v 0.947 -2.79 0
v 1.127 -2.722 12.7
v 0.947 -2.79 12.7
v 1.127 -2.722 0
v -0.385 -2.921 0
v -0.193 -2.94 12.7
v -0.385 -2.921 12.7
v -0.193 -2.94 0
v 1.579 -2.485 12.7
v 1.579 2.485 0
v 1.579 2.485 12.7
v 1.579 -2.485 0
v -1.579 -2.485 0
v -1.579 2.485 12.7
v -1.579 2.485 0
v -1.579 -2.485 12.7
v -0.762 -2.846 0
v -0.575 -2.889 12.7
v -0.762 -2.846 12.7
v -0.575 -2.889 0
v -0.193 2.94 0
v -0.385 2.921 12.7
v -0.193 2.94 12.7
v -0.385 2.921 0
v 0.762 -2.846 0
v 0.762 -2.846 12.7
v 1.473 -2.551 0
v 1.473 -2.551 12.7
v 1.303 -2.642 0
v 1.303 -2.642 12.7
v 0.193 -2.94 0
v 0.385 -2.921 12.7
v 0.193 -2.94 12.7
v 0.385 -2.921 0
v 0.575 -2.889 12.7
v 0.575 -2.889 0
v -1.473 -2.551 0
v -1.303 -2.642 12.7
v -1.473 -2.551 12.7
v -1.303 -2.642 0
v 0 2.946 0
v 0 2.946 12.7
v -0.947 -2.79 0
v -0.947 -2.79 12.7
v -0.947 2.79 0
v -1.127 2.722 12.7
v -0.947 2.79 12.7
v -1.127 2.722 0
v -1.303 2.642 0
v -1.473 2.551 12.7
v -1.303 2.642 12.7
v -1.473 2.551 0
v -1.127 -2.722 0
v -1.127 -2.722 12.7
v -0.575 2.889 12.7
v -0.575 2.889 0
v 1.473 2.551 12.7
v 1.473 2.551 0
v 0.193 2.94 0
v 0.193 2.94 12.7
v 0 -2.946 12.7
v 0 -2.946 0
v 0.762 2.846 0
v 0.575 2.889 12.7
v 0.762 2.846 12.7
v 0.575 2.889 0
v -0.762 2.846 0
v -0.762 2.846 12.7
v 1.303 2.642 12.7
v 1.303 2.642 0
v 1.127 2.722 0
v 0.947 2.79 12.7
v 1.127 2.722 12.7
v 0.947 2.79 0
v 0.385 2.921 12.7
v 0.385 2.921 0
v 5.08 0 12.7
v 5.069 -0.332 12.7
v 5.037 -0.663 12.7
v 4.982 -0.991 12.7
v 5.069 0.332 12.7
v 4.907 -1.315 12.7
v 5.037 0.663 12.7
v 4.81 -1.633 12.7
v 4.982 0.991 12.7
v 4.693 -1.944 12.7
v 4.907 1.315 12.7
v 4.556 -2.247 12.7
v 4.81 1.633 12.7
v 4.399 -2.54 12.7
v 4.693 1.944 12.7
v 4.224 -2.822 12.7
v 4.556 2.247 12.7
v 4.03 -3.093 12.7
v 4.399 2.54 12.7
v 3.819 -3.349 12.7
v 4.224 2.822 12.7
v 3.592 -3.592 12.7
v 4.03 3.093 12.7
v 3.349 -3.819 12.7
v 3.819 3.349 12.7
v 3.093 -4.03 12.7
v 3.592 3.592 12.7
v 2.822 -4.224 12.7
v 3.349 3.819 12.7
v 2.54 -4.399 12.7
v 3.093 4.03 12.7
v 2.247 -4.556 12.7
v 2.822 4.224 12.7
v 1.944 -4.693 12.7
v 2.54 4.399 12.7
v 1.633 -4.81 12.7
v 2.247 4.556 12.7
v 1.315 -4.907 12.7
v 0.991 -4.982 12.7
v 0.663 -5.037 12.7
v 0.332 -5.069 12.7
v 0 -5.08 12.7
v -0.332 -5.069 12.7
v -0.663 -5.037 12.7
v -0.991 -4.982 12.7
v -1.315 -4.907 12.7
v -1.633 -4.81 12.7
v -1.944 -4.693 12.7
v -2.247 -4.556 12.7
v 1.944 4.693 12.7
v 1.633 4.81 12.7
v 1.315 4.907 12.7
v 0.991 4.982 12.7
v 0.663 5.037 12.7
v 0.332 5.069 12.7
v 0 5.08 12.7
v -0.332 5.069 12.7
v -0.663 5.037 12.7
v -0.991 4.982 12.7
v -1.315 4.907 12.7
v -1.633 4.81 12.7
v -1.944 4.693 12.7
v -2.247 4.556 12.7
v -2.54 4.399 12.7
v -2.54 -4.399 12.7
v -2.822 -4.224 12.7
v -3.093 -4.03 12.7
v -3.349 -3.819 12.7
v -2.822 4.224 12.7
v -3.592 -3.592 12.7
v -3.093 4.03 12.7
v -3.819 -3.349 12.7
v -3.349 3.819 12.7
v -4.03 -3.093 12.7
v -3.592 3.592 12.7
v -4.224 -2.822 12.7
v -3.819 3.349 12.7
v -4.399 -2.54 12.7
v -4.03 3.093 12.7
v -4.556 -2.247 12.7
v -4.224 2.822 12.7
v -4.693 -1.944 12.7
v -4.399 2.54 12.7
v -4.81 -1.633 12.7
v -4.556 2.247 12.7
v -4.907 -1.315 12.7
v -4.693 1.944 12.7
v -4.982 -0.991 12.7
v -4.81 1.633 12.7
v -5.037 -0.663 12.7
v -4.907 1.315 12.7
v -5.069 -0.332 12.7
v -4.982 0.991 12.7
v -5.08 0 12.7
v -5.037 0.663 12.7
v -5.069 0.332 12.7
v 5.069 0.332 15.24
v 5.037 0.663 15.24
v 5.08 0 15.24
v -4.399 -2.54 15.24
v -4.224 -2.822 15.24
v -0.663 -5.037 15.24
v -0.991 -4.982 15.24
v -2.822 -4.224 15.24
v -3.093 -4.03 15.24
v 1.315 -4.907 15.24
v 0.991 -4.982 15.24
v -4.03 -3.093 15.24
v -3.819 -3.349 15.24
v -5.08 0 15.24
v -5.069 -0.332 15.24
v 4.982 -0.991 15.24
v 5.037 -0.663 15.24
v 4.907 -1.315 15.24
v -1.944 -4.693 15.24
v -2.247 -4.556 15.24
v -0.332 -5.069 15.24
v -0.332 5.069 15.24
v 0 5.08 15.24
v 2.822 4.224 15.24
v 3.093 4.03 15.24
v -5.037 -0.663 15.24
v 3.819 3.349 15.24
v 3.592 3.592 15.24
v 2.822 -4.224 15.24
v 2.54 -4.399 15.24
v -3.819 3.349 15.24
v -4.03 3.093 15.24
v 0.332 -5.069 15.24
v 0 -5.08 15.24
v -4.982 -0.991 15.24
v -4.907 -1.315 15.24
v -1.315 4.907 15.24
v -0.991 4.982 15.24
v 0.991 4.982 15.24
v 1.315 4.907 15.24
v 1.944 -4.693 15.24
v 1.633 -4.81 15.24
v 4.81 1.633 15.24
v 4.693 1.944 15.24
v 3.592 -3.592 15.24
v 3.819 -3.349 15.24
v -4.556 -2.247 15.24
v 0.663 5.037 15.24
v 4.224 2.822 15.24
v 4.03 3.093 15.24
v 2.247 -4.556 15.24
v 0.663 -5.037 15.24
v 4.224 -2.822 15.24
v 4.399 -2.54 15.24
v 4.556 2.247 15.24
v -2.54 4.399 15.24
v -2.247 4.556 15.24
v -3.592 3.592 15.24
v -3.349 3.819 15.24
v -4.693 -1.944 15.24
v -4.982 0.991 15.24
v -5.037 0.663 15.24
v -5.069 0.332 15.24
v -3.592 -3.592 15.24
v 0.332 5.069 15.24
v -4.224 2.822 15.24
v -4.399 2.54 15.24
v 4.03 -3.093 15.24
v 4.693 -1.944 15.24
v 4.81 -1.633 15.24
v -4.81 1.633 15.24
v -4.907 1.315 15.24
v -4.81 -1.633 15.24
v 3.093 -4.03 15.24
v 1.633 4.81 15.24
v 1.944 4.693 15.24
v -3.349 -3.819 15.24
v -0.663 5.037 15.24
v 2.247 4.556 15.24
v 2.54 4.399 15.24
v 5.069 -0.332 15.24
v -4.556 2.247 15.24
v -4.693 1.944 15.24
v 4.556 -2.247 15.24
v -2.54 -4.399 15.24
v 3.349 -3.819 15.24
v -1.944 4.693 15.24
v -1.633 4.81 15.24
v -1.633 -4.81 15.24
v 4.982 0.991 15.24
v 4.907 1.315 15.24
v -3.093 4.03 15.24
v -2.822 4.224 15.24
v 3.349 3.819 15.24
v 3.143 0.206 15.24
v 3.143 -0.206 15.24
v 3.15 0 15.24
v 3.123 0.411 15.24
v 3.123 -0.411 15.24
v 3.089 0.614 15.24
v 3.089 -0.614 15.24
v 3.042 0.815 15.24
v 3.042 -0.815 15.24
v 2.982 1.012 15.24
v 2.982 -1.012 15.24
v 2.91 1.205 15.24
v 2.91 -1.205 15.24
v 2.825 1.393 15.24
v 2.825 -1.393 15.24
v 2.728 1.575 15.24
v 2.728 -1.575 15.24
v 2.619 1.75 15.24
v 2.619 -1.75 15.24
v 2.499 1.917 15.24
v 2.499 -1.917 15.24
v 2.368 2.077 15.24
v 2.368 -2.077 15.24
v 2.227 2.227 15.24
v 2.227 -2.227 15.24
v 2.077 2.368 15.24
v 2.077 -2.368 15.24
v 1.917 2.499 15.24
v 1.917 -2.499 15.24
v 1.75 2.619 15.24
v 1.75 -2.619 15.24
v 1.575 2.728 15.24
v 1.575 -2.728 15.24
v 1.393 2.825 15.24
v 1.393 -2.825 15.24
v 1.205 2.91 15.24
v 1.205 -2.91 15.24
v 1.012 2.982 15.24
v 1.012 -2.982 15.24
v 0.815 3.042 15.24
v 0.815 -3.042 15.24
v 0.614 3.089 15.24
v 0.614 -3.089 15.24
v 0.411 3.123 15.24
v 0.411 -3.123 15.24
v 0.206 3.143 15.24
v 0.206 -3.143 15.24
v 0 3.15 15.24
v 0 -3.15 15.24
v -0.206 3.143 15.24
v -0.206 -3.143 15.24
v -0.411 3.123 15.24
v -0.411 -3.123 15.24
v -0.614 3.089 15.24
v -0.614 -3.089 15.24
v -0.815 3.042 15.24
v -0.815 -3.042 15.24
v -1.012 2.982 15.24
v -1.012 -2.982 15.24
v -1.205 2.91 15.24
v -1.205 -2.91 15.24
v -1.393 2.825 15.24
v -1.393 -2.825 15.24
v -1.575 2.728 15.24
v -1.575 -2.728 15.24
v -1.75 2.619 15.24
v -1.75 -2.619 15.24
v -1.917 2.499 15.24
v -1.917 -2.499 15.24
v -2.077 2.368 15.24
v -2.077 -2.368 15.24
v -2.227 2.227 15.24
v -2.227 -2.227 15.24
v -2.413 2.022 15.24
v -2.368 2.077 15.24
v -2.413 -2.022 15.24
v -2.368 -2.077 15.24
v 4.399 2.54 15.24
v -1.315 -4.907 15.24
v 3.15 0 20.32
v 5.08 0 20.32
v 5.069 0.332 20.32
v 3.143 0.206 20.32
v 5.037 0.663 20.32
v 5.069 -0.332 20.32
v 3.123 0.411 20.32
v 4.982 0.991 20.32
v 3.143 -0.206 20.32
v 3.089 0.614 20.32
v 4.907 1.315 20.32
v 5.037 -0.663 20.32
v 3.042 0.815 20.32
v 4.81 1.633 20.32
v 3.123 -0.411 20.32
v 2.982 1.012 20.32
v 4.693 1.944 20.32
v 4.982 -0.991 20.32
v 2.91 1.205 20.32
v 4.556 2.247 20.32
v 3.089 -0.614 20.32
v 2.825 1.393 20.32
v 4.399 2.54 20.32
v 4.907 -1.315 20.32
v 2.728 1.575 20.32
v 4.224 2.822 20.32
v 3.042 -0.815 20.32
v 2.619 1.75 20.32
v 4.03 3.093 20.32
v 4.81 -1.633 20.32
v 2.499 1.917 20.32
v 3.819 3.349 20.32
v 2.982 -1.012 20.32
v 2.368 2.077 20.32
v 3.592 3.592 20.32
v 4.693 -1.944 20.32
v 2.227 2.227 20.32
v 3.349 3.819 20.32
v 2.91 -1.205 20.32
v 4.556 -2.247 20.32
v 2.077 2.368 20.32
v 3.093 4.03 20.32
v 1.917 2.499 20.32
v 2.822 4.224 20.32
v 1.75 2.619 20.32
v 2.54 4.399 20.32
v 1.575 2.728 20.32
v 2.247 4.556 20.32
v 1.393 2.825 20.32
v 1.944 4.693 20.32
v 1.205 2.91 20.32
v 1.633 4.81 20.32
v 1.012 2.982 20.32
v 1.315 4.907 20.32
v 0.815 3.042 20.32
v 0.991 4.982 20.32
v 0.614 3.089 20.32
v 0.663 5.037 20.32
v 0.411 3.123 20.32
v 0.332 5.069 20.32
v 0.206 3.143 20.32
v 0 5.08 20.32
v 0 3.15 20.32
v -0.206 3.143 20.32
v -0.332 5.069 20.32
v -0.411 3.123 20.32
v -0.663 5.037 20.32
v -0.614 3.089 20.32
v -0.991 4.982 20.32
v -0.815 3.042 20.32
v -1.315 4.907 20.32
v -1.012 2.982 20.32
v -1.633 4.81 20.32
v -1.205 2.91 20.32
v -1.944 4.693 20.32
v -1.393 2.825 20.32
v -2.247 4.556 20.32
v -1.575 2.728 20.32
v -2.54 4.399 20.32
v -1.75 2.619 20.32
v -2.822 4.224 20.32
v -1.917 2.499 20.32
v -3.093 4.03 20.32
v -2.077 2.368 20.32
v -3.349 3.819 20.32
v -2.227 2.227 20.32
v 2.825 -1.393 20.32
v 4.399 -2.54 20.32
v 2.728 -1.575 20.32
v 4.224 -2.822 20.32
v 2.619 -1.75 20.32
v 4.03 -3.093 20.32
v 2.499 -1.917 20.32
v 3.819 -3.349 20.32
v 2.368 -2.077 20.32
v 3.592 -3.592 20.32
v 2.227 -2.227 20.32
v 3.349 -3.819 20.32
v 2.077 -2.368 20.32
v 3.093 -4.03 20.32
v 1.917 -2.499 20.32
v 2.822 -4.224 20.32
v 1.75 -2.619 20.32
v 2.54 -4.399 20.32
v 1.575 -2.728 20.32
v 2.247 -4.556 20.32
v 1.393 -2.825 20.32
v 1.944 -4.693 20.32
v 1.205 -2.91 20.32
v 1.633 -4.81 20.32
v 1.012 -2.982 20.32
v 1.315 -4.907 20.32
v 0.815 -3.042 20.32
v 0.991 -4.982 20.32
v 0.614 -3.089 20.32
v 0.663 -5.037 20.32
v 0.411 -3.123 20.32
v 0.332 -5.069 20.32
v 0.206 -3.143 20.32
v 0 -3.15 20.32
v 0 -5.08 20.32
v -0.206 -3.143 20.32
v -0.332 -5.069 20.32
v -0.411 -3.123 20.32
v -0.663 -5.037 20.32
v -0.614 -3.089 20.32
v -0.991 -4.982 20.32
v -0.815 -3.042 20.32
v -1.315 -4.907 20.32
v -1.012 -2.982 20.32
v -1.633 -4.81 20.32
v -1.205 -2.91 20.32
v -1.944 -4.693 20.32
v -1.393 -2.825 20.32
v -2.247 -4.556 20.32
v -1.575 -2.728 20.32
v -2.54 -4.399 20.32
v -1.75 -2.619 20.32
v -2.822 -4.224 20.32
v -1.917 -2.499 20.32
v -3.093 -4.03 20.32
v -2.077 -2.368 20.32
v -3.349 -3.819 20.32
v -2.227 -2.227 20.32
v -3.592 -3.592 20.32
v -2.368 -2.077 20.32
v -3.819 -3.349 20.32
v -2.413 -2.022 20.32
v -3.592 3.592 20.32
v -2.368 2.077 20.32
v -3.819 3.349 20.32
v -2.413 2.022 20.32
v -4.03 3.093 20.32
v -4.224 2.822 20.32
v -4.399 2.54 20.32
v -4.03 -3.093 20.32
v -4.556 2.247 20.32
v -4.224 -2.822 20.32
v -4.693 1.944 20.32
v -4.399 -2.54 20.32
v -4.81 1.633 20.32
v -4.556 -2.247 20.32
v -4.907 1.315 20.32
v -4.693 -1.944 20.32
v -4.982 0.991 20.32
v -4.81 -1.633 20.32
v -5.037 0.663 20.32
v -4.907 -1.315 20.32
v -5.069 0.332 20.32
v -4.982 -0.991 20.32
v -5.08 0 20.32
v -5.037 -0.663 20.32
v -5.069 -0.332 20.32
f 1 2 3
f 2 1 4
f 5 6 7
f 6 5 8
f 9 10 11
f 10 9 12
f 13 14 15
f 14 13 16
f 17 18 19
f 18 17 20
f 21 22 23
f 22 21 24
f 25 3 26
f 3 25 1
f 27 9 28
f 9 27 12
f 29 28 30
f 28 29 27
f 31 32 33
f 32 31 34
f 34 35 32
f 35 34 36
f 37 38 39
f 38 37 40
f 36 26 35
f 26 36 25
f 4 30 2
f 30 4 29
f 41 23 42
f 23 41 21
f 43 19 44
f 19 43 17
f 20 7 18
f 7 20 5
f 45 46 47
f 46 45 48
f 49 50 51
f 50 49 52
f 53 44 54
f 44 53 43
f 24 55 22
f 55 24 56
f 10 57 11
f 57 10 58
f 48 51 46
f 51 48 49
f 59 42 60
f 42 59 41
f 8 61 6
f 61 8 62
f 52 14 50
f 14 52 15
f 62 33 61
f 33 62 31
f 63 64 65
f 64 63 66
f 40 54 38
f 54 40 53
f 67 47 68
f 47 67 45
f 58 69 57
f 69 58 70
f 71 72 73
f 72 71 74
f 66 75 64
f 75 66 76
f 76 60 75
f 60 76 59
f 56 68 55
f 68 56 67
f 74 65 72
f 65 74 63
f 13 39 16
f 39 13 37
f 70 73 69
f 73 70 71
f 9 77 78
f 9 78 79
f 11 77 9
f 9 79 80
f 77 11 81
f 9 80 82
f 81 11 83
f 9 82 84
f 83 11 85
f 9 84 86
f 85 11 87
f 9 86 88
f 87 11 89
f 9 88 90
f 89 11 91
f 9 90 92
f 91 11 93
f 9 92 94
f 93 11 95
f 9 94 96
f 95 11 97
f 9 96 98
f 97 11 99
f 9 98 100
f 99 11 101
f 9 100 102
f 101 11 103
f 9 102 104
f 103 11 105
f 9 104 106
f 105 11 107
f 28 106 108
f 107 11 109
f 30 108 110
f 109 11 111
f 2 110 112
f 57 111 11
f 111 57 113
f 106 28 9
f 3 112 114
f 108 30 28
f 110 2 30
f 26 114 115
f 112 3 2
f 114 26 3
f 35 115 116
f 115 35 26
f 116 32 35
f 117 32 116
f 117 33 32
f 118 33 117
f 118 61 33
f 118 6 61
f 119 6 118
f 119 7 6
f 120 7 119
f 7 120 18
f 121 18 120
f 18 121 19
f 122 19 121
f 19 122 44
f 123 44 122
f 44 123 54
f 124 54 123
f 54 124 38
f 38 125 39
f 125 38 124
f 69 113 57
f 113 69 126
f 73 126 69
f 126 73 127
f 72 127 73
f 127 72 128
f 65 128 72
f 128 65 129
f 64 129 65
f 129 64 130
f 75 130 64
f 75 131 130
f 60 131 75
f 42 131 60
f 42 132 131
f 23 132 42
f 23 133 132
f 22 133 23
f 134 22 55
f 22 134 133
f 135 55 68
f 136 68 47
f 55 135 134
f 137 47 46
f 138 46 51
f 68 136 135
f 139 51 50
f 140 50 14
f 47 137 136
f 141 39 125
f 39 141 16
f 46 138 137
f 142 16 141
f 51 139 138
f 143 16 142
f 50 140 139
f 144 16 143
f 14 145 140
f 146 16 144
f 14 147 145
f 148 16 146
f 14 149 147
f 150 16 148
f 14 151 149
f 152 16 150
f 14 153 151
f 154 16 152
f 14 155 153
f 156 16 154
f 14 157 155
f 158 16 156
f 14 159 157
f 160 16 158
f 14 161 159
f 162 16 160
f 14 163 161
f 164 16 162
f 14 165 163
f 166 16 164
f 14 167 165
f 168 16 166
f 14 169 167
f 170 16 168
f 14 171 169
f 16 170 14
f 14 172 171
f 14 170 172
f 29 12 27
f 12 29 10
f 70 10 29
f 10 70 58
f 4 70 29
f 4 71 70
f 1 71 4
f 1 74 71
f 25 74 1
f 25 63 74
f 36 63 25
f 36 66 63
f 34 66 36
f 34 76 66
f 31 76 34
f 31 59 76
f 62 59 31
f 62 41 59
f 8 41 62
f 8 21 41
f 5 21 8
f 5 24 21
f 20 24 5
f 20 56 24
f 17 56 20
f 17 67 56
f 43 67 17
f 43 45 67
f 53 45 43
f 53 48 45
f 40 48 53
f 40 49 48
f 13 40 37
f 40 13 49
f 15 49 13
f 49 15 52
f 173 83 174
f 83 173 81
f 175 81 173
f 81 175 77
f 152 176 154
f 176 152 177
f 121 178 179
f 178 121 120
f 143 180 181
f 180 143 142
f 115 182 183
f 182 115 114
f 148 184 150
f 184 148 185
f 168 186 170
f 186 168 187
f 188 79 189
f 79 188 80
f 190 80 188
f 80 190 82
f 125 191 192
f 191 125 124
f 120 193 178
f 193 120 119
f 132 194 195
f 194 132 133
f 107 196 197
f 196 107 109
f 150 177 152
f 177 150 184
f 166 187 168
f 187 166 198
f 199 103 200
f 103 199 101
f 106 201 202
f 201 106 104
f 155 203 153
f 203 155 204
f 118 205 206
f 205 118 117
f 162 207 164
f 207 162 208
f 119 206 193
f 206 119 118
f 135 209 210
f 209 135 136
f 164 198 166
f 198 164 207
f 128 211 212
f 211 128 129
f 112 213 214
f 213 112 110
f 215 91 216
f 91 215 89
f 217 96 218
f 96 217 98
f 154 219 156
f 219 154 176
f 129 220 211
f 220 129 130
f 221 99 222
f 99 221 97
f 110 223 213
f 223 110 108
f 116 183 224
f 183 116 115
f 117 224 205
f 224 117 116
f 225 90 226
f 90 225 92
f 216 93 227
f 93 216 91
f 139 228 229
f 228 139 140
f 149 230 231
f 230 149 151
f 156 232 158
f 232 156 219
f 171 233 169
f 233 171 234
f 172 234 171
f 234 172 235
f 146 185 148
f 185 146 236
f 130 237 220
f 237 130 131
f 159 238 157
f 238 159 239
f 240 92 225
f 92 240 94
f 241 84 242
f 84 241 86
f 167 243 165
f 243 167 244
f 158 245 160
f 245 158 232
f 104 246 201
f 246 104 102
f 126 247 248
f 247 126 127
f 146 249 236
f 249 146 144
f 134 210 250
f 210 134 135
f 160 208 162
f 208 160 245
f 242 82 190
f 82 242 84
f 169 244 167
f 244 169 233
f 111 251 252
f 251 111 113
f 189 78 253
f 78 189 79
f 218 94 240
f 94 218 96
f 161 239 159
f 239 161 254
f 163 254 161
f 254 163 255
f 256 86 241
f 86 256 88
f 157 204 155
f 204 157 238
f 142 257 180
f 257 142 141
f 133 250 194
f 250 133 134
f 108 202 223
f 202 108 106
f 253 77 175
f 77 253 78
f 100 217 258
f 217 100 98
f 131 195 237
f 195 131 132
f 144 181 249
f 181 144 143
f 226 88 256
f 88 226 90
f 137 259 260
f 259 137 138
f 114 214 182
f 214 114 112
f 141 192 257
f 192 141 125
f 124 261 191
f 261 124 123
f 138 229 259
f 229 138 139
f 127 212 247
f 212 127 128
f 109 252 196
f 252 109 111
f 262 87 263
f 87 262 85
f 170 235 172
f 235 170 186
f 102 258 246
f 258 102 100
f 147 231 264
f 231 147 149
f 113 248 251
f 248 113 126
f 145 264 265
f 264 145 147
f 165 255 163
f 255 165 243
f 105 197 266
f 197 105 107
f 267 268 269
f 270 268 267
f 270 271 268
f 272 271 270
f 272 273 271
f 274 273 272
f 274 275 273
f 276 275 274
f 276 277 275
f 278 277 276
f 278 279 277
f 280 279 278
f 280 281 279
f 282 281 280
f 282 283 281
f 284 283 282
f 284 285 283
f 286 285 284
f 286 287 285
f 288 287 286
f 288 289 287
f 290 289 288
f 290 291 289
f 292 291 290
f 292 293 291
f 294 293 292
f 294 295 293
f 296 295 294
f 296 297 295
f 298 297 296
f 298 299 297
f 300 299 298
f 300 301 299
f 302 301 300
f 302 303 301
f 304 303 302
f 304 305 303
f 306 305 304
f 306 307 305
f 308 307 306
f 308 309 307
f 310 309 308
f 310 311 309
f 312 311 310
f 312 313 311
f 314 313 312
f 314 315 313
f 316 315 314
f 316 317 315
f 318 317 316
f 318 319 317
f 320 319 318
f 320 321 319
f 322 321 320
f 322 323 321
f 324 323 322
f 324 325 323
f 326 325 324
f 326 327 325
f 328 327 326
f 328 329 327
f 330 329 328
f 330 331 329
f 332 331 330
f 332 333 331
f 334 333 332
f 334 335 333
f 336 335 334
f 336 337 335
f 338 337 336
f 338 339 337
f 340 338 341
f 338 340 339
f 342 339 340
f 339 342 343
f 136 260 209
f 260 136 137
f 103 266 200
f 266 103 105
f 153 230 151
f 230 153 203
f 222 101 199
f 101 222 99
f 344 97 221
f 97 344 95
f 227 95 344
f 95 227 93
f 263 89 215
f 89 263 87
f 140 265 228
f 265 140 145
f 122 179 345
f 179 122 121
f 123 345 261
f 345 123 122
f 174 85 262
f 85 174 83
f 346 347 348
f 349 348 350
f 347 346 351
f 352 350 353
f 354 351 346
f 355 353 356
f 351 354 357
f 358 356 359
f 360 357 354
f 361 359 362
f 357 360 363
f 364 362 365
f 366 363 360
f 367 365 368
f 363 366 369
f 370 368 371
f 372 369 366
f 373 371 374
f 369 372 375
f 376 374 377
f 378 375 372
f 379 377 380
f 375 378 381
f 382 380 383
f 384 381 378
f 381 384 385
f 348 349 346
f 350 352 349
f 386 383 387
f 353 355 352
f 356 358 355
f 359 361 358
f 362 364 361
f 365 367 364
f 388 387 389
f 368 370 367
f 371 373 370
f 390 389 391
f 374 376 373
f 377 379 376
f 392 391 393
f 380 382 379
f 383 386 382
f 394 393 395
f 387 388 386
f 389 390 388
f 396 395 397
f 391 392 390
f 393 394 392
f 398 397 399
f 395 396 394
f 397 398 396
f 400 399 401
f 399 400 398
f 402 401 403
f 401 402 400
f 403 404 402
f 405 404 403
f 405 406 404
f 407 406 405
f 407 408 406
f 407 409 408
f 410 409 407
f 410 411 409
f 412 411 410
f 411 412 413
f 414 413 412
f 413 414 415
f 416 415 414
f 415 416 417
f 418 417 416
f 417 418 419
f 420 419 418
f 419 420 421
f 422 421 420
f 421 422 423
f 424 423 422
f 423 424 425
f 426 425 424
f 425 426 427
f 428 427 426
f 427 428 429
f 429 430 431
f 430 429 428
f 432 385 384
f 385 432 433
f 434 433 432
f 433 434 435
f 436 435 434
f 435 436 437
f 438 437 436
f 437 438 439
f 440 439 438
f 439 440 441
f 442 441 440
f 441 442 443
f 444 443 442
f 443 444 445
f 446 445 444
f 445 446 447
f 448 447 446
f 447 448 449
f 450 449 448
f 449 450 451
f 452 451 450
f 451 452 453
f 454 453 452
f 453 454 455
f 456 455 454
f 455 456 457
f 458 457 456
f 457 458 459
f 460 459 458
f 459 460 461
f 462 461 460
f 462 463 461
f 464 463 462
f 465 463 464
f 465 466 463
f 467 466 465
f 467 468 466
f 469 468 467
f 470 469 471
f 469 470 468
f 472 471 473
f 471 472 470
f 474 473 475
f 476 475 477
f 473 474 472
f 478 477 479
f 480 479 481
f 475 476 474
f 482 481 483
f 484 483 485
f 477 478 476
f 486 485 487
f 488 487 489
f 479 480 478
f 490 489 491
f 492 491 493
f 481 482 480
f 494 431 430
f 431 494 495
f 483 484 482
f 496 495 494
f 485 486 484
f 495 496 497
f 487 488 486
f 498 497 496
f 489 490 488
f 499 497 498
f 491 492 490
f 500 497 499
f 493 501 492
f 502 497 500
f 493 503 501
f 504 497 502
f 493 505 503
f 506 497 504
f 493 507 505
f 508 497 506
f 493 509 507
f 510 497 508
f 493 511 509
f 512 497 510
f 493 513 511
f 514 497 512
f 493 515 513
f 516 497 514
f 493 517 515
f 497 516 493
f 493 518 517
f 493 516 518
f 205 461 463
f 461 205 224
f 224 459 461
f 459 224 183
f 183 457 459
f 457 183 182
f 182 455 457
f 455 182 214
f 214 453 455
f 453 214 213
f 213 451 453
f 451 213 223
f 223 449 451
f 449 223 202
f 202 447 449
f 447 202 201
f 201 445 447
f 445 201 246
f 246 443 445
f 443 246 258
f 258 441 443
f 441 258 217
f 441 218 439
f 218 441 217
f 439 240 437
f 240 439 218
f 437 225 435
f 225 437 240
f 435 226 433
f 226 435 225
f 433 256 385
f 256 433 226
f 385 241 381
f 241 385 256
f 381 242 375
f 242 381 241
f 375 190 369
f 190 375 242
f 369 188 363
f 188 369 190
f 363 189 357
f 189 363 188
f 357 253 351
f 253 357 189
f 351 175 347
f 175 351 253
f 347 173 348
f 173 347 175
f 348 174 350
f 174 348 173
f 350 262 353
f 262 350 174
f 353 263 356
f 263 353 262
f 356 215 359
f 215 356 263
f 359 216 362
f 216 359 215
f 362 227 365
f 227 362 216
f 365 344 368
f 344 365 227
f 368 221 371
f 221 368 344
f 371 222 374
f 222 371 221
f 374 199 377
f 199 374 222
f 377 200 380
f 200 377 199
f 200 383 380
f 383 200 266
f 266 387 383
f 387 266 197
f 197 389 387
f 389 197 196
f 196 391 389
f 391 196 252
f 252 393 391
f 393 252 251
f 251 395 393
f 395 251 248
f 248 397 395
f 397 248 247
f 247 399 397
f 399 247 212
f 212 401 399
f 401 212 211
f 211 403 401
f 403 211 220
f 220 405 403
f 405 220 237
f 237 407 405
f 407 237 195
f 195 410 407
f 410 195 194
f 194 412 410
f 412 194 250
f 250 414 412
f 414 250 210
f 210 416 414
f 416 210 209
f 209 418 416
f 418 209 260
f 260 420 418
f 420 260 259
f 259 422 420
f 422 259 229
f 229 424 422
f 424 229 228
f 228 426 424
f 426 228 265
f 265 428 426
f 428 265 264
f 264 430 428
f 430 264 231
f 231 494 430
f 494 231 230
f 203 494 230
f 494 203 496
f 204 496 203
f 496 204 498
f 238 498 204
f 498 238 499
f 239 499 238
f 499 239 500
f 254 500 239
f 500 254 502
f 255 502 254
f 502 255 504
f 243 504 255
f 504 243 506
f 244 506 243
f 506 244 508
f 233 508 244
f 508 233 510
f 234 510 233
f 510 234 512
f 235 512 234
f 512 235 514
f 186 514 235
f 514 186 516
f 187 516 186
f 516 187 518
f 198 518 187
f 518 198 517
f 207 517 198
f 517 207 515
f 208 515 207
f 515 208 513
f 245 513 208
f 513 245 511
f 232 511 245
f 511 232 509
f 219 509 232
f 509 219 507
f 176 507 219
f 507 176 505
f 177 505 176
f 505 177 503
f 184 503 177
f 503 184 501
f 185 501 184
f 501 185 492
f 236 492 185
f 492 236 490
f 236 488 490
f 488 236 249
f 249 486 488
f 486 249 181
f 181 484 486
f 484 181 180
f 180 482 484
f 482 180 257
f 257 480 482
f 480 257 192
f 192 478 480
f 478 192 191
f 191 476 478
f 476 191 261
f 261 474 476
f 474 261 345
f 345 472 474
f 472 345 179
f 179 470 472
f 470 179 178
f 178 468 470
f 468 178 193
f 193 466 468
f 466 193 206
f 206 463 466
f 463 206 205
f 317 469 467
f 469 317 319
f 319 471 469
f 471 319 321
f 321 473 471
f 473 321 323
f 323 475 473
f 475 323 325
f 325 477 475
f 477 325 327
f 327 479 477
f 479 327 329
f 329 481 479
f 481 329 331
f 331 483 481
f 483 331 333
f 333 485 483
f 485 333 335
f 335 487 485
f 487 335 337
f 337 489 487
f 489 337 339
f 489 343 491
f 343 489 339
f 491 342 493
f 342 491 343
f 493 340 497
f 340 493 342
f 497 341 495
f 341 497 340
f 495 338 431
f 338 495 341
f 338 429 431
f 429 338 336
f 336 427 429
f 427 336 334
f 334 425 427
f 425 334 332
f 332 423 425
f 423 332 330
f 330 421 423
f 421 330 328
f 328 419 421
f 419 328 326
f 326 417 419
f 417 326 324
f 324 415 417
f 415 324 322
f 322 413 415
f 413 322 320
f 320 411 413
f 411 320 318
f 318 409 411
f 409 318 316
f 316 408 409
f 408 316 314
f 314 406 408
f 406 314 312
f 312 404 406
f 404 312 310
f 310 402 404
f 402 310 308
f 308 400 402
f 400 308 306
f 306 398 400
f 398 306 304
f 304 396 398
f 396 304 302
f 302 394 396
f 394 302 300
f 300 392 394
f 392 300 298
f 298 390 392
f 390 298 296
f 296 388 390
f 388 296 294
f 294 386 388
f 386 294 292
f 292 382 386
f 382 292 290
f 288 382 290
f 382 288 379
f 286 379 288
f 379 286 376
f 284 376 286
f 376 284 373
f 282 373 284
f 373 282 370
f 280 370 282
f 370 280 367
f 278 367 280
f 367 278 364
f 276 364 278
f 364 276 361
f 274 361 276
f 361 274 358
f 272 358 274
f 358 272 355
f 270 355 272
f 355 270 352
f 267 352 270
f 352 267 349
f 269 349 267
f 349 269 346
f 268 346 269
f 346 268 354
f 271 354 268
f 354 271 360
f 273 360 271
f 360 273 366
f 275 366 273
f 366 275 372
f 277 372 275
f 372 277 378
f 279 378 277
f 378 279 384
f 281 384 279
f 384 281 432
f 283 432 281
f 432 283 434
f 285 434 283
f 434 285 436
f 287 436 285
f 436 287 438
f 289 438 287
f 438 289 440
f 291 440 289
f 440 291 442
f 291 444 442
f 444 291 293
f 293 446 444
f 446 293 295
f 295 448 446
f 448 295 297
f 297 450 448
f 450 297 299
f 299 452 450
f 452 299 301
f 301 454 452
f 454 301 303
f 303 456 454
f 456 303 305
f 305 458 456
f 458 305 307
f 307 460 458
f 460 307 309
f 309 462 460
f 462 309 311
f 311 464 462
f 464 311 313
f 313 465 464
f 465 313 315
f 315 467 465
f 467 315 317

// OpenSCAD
ViewScale = [0.0254, 0.0254, 0.0254];

dsunhole = 6.4/25.4*1000;
cutoff = dsunhole/sqrt(2);

module gearMotorInsert()
{
    difference() {
        circle(200, $fn=96);
        intersection() {
            circle(124, $fn=96);
            translate([30, 0, 0])
            square([250, 400], center=true);
        }
    }
}

module gearsetShaft()
{
    difference() {
    circle(dsunhole/2-10, $fn=96);
    translate([cutoff+10, 0, 0])
    square(dsunhole, dsunhole, center = true);
    rotate([0, 0, 180])
    translate([cutoff+10, 0, 0])
    square(dsunhole, dsunhole, center = true);
    }

}

scale(ViewScale)
{
    linear_extrude(500)
    gearsetShaft();

    translate([0, 0, 500])
    linear_extrude(100)
    circle(200, $fn=96);


    translate([0, 0, 600])
    linear_extrude(200)
    gearMotorInsert();
}
